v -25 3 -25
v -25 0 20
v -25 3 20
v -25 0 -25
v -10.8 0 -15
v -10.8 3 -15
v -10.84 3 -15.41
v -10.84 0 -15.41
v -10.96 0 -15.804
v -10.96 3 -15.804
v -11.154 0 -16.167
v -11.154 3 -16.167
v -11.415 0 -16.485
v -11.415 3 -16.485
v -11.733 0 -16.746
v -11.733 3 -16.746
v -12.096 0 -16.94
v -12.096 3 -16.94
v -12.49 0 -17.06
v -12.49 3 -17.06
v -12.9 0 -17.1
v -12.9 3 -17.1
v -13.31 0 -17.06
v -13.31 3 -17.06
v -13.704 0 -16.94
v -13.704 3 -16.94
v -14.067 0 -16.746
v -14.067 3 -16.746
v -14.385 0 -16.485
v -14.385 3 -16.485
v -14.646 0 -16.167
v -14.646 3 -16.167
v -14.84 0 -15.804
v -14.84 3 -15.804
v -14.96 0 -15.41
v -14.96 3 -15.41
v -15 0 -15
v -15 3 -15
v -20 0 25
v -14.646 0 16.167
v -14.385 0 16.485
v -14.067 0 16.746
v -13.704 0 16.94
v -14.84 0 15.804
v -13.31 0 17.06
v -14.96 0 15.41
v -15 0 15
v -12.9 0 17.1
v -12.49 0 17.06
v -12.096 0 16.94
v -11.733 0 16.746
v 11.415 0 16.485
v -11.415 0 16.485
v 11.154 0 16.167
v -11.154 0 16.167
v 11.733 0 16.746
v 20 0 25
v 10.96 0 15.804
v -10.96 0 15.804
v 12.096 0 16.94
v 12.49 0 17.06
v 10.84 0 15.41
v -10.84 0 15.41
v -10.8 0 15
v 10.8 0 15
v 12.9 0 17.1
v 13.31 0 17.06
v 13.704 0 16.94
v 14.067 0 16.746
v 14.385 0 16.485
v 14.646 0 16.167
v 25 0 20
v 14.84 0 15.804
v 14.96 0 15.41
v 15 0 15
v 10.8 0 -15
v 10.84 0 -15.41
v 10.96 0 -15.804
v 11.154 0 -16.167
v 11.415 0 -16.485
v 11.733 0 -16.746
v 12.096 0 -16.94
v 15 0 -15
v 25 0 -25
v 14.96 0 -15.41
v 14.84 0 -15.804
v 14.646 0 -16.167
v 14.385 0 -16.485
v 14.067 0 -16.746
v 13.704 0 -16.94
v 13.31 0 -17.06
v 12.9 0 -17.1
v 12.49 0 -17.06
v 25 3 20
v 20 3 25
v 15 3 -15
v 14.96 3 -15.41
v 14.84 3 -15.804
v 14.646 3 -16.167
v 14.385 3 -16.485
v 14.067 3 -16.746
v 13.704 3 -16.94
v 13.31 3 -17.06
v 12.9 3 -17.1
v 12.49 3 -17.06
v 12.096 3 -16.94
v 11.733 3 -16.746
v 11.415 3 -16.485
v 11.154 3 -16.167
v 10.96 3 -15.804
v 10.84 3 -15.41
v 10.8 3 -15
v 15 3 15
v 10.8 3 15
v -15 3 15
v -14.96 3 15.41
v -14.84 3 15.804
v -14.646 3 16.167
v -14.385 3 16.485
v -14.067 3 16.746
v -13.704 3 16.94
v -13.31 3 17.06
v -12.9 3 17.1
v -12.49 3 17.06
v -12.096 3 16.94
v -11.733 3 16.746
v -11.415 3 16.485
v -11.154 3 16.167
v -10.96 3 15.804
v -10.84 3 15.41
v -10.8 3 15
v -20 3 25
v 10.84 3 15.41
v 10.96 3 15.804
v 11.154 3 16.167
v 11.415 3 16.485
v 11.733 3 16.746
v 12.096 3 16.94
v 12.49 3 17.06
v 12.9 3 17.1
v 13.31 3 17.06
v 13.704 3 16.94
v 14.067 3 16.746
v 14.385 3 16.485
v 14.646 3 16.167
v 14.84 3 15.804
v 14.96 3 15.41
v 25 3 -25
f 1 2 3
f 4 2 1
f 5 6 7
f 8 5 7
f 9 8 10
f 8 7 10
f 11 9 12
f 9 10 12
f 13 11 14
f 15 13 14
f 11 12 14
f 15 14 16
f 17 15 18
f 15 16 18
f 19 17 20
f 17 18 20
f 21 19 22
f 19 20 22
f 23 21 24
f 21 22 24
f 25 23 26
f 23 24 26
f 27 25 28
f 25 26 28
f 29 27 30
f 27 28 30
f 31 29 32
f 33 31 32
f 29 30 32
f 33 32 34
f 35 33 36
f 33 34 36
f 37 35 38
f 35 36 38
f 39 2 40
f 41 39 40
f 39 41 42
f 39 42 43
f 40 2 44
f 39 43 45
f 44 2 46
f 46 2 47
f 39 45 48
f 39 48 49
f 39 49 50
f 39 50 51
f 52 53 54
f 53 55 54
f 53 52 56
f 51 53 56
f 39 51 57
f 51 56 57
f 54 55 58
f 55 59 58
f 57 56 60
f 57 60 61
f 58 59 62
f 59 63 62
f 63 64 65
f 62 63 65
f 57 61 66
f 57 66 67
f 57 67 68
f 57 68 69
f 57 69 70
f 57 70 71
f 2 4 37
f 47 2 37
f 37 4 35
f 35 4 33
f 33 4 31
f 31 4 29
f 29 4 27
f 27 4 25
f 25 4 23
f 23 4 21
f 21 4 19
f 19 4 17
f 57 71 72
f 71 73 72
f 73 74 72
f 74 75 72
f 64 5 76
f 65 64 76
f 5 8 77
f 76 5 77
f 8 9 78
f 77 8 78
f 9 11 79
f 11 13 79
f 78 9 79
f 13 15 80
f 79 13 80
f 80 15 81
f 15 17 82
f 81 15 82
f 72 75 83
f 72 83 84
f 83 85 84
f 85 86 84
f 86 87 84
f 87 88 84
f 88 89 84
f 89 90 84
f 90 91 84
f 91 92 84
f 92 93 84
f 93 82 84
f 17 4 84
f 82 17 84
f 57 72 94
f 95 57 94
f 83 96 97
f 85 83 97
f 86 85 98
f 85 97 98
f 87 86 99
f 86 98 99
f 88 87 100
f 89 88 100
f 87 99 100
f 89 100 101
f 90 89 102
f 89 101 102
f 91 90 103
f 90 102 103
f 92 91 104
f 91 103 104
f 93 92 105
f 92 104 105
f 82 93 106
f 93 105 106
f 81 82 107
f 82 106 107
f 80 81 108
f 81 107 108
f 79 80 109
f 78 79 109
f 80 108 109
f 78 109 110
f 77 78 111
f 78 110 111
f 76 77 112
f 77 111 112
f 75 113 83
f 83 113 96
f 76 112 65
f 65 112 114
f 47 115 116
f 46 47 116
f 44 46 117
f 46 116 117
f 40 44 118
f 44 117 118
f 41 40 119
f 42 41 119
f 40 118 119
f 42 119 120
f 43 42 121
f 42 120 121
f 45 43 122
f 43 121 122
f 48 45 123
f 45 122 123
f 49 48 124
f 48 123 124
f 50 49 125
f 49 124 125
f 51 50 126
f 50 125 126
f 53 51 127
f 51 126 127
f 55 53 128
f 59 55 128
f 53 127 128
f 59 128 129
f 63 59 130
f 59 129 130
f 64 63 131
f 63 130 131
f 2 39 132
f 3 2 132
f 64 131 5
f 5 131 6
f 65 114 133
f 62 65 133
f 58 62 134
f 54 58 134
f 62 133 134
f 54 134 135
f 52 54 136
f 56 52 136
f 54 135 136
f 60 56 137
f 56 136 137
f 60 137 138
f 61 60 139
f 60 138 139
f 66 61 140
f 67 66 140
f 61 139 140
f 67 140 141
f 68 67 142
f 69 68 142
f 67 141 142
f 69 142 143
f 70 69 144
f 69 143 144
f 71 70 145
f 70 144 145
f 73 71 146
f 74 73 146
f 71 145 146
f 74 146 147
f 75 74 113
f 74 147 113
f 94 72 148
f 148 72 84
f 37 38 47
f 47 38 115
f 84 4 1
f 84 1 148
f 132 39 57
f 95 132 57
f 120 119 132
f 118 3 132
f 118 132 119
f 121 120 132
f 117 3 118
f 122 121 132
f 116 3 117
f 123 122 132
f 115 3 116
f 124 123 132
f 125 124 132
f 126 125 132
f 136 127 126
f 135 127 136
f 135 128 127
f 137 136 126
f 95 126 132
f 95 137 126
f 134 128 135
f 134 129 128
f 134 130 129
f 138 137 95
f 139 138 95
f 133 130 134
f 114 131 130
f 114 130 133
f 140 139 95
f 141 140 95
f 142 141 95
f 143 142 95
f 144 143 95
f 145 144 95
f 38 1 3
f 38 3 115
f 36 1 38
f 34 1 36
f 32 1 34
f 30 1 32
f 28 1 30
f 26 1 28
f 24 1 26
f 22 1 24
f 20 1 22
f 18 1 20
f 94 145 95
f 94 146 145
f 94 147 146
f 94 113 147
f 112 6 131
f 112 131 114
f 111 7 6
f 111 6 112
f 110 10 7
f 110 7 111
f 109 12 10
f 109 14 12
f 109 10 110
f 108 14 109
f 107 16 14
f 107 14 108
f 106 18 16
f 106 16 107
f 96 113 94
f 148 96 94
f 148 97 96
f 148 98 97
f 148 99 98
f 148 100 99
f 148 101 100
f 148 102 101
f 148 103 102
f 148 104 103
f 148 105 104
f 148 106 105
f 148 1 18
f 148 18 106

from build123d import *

# Parameters (mm, degrees)
SKETCH1_W           = 50
SKETCH1_H           = 50
BOSS_EXTRUDE1_DEPTH = 3
CHAMFER1_SIZE       = 5
CUT_EXTRUDE1_DEPTH  = 10


with BuildPart() as part:
    # Sketch1 → Boss-Extrude1 (new body)
    with BuildSketch(Plane(origin=(0, 0, 0), x_dir=(1, 0, 0), z_dir=(0, 1, 0))):
        Rectangle(SKETCH1_W, SKETCH1_H)
    extrude(amount=BOSS_EXTRUDE1_DEPTH)

    # Chamfer1
    chamfer1_edges = [part.edges().sort_by_distance(p)[0] for p in [
        (25, 1.5, 25),
        (-25, 1.5, 25),
    ]]
    chamfer(chamfer1_edges, length=CHAMFER1_SIZE)

    # Sketch2 → Cut-Extrude1 (cut)
    with BuildSketch(Plane(origin=(0, 3, 0), x_dir=(1, 0, 0), z_dir=(0, 1, 0))):
        with BuildLine():
            Line((-10.8, -15), (-10.8, 15))
            ThreePointArc((-10.8, 15), (-12.9, 12.9), (-15, 15))
            Line((-15, 15), (-15, -15))
            ThreePointArc((-15, -15), (-12.9, -12.9), (-10.8, -15))
        make_face()
        with BuildLine():
            ThreePointArc((-15, 15), (-12.9, 12.9), (-10.8, 15))
            Line((-10.8, 15), (-15, 15))
        make_face()
        with BuildLine():
            Line((-15, 15), (-10.8, 15))
            ThreePointArc((-10.8, 15), (-12.9, 17.1), (-15, 15))
        make_face()
        with BuildLine():
            ThreePointArc((-15, -15), (-12.9, -17.1), (-10.8, -15))
            Line((-10.8, -15), (-15, -15))
        make_face()
        with BuildLine():
            Line((-15, -15), (-10.8, -15))
            ThreePointArc((-10.8, -15), (-12.9, -12.9), (-15, -15))
        make_face()
        with BuildLine():
            ThreePointArc((15, -15), (12.9, -12.9), (10.8, -15))
            Line((10.8, -15), (15, -15))
        make_face()
        with BuildLine():
            Line((15, -15), (10.8, -15))
            ThreePointArc((10.8, -15), (12.9, -17.1), (15, -15))
        make_face()
        with BuildLine():
            ThreePointArc((15, 15), (12.9, 12.9), (10.8, 15))
            Line((10.8, 15), (10.8, -15))
            ThreePointArc((10.8, -15), (12.9, -12.9), (15, -15))
            Line((15, -15), (15, 15))
        make_face()
        with BuildLine():
            ThreePointArc((15, 15), (12.9, 17.1), (10.8, 15))
            Line((10.8, 15), (15, 15))
        make_face()
        with BuildLine():
            Line((15, 15), (10.8, 15))
            ThreePointArc((10.8, 15), (12.9, 12.9), (15, 15))
        make_face()
    extrude(amount=-CUT_EXTRUDE1_DEPTH, mode=Mode.SUBTRACT)


solid = part.part
